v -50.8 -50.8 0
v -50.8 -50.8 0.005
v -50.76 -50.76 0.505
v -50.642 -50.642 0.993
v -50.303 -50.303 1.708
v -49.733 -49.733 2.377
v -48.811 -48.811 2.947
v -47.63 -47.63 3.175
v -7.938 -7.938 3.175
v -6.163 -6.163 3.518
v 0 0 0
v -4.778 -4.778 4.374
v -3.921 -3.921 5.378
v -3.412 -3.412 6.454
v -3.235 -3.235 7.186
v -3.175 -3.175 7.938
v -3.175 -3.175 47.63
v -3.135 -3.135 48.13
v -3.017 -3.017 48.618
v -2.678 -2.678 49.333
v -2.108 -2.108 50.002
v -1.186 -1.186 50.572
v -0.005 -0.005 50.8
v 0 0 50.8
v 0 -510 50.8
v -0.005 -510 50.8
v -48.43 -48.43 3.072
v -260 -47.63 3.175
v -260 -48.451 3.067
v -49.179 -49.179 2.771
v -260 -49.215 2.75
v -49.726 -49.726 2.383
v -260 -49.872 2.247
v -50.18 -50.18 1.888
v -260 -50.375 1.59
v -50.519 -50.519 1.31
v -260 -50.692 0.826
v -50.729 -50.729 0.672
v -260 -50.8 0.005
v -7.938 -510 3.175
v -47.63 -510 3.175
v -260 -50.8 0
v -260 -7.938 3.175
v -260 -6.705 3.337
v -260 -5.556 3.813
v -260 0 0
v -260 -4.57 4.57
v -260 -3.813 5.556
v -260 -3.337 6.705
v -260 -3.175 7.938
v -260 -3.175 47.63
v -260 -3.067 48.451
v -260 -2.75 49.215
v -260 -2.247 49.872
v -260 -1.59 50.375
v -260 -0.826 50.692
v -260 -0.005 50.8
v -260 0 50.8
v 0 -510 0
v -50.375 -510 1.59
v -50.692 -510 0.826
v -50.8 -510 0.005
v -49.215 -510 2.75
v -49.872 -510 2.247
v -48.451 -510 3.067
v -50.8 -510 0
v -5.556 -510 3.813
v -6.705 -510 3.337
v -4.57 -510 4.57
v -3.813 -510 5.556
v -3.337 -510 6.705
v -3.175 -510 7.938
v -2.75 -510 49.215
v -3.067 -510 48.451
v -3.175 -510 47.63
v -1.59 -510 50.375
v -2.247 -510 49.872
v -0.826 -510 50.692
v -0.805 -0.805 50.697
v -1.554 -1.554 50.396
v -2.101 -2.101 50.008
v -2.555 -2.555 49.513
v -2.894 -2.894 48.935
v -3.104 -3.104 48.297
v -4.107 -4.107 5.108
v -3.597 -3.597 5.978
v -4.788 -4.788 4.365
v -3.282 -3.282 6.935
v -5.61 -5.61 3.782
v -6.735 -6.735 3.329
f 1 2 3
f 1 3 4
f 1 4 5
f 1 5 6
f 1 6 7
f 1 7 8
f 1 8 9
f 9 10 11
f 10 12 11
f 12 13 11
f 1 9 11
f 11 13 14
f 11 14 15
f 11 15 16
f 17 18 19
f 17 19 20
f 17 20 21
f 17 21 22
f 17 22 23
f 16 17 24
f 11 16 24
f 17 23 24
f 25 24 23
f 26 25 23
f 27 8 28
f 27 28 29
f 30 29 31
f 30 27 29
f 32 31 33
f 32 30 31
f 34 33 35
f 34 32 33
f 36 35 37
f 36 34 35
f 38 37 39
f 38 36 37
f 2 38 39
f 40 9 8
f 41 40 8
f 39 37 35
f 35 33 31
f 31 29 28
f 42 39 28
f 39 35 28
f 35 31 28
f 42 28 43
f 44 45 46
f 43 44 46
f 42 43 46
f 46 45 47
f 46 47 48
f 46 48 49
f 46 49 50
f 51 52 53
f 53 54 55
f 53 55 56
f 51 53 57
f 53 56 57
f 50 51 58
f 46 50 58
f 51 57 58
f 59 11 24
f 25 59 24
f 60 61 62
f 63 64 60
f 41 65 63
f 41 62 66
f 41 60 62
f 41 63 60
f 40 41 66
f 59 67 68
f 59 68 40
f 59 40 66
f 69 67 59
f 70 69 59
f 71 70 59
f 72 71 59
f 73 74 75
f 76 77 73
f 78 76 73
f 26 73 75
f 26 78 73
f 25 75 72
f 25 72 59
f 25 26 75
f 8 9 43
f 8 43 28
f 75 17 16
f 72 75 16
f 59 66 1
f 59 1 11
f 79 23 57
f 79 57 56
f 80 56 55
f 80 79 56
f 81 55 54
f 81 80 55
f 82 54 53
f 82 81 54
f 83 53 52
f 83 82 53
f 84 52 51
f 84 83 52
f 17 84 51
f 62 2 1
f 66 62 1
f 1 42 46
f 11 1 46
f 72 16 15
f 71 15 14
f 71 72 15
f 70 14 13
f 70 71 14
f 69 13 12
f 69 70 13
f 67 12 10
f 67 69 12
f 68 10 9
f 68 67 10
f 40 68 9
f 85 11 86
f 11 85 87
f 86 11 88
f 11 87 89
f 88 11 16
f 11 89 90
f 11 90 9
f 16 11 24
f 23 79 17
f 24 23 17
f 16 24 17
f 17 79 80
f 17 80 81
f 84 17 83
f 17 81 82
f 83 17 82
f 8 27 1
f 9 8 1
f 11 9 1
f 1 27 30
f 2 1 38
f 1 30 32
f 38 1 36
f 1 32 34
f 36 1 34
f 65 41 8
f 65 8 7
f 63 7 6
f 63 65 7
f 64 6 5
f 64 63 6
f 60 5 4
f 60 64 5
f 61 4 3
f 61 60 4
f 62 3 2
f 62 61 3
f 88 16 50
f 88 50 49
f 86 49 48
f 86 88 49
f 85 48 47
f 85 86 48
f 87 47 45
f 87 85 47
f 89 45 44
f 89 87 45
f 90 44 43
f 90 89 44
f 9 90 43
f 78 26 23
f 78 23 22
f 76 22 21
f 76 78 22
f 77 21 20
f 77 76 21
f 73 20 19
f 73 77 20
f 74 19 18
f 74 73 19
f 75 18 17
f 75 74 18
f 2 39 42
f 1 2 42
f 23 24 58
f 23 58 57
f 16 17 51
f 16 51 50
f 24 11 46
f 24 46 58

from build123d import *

# Parameters (mm, degrees)
HIERRO_ANGULAR_2_X_2_X_0_125_1_DEPTH        = 582.842048969
HIERRO_ANGULAR_2_X_2_X_0_125_1_2_DEPTH      = 260
HIERRO_ANGULAR_2_X_2_X_0_125_1_2_DEPTH_BACK = 72.842048969


with BuildPart() as part:
    # Sketch1 on segment 1 (carried to segment 1) → Hierro angular 2 X 2 X 0.125(1) (new body)
    with BuildSketch(Plane(origin=(0, -510, 0), x_dir=(-1, 0, 0), z_dir=(0, 1, 0))):
        with BuildLine():
            Line((0, 0), (0, 50.8))
            Line((0, 50.8), (0.00508, 50.8))
            ThreePointArc((0.00508, 50.8), (2.246551928, 49.871551928), (3.175, 47.63008))
            Line((3.175, 47.63008), (3.175, 7.9375))
            ThreePointArc((3.175, 7.9375), (4.569903955, 4.569903955), (7.9375, 3.175))
            Line((7.9375, 3.175), (47.63008, 3.175))
            ThreePointArc((47.63008, 3.175), (49.871551928, 2.246551928), (50.8, 0.00508))
            Line((50.8, 0.00508), (50.8, 0))
            Line((50.8, 0), (0, 0))
        make_face()
    extrude(amount=HIERRO_ANGULAR_2_X_2_X_0_125_1_DEPTH)

    # Hierro angular 2 X 2 X 0.125(1) mitre 1
    split(bisect_by=Plane(origin=(0, 0, 0), x_dir=(0.707106781, 0.707106781, 0), z_dir=(0.707106781, -0.707106781, 0)), keep=Keep.TOP)


with BuildPart() as body_2:
    # Sketch1 → Hierro angular 2 X 2 X 0.125_1 2 (new, two sides: drawn at the far end of the back side and taken through both)
    with BuildSketch(Plane(origin=(0, 0, 0), x_dir=(0, -1, 0), z_dir=(-1, 0, 0)).offset(-HIERRO_ANGULAR_2_X_2_X_0_125_1_2_DEPTH_BACK)):
        with BuildLine():
            Line((0, 0), (0, 50.8))
            Line((0, 50.8), (0.00508, 50.8))
            ThreePointArc((0.00508, 50.8), (2.246551928, 49.871551928), (3.175, 47.63008))
            Line((3.175, 47.63008), (3.175, 7.9375))
            ThreePointArc((3.175, 7.9375), (4.569903955, 4.569903955), (7.9375, 3.175))
            Line((7.9375, 3.175), (47.63008, 3.175))
            ThreePointArc((47.63008, 3.175), (49.871551928, 2.246551928), (50.8, 0.00508))
            Line((50.8, 0.00508), (50.8, 0))
            Line((50.8, 0), (0, 0))
        make_face()
    extrude(amount=HIERRO_ANGULAR_2_X_2_X_0_125_1_2_DEPTH + HIERRO_ANGULAR_2_X_2_X_0_125_1_2_DEPTH_BACK)

    # Hierro angular 2 X 2 X 0.125_1 2 mitre 1
    split(bisect_by=Plane(origin=(0, 0, 0), x_dir=(-0.707106781, -0.707106781, 0), z_dir=(-0.707106781, 0.707106781, 0)), keep=Keep.TOP)


solid = Compound([part.part, body_2.part])
